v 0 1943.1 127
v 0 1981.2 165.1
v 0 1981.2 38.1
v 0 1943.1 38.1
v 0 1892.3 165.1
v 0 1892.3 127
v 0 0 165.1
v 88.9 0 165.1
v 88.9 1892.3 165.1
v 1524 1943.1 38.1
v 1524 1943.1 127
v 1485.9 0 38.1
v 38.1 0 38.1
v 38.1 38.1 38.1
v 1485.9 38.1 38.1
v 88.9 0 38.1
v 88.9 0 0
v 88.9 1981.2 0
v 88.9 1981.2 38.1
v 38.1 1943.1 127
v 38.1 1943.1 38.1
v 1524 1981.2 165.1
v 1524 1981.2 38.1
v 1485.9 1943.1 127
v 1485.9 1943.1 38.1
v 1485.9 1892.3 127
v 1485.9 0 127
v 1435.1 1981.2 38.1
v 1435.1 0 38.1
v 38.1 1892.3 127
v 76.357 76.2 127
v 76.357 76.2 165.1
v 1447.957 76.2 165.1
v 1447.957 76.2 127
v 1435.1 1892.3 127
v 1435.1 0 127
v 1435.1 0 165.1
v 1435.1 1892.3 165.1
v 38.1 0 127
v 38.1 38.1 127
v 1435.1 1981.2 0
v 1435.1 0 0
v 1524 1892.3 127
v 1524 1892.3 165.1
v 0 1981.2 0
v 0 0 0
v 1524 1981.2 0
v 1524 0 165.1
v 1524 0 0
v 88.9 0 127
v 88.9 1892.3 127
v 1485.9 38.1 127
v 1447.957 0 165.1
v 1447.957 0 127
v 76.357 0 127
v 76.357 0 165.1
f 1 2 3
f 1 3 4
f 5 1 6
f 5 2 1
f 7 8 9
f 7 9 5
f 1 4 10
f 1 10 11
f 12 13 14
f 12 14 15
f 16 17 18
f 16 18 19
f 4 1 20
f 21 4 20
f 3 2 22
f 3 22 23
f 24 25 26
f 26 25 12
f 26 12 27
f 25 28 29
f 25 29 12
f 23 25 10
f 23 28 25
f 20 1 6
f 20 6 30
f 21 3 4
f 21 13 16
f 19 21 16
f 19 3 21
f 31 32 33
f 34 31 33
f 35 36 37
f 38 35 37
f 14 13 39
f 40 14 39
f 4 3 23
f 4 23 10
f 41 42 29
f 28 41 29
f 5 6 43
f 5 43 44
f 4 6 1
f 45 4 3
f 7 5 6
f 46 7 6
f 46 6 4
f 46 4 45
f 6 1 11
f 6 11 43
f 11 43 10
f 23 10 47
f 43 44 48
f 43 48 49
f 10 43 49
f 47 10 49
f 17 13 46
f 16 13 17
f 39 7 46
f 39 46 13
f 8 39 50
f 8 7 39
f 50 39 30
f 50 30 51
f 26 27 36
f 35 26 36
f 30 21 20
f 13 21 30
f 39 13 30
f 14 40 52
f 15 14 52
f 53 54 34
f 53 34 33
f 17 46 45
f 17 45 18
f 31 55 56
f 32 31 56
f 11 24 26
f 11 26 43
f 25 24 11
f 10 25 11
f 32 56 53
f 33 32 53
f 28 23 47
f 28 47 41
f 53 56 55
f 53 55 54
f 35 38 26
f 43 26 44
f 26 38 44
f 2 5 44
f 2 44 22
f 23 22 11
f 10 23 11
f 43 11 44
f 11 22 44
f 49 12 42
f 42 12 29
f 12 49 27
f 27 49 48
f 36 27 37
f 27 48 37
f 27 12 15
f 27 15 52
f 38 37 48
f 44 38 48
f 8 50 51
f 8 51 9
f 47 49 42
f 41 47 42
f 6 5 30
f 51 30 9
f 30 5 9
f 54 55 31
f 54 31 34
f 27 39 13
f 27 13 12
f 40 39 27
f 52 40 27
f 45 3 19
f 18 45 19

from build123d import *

# Parameters (mm, degrees)
F0_W      = 38.1
F0_H      = 88.9
F1_DEPTH  = 1981.2
F4_W      = 1524
F4_H      = 88.9
F5_DEPTH  = 38.1
F6_W      = 1524
F6_H      = 38.1
F7_DEPTH  = 88.9
F9_DEPTH  = 1524
F10_W     = 1447.8
F10_H     = 88.9
F11_DEPTH = 38.1
F12_W     = 1371.6
F12_H     = 38.1
F13_DEPTH = 76.2


with BuildPart() as f1:
    # F0 (on Front) → F1 (new body)
    with BuildSketch(Plane.XZ):
        Polygon((0, 38.1), (0, 0), (88.9, 0), (88.9, 38.1), (38.1, 38.1), align=None)
        with Locations((19.05, 82.55)):
            Rectangle(F0_W, F0_H)
        Polygon((0, 165.1), (0, 127), (38.1, 127), (88.9, 127), (88.9, 165.1), align=None)
    extrude(amount=-F1_DEPTH)


with BuildPart() as f3_1:
    # F3: instance of F1
    add(f1.part.mirror(Plane.YZ.offset(762)))


with BuildPart() as f5_tool:
    # F4 (on face) → F5 (new body)
    with BuildSketch(Plane.XY.offset(165.1)):
        with Locations((762, 1936.75)):
            Rectangle(F4_W, F4_H)
    extrude(amount=-F5_DEPTH)


with BuildPart() as f1_1:
    add(f1.part)

    # F5: cut by f5_tool
    add(f5_tool.part, mode=Mode.SUBTRACT)


with BuildPart() as f3_1_1:
    add(f3_1.part)

    # F5: cut by f5_tool
    add(f5_tool.part, mode=Mode.SUBTRACT)


with BuildPart() as f7_tool:
    # F6 (on face) → F7 (new body)
    with BuildSketch(Plane.XY.offset(127)):
        with Locations((762, 1962.15)):
            Rectangle(F6_W, F6_H)
    extrude(amount=-F7_DEPTH)


with BuildPart() as f1_2:
    add(f1_1.part)

    # F7: cut by f7_tool
    add(f7_tool.part, mode=Mode.SUBTRACT)


with BuildPart() as f3_1_2:
    add(f3_1_1.part)

    # F7: cut by f7_tool
    add(f7_tool.part, mode=Mode.SUBTRACT)


with BuildPart() as f9:
    # F8 (on face) → F9 (new body)
    with BuildSketch(Plane(origin=(0, 0, 0), x_dir=(0, -1, 0), z_dir=(-1, 0, 0))):
        Polygon((-1892.3, 127), (-1892.3, 165.1), (-1981.2, 165.1), (-1981.2, 38.1), (-1943.1, 38.1), (-1943.1, 127), align=None)
    extrude(amount=-F9_DEPTH)


with BuildPart() as f11:
    # F10 (on face) → F11 (new body)
    with BuildSketch(Plane.XZ):
        with Locations((762, 82.55)):
            Rectangle(F10_W, F10_H)
    extrude(amount=-F11_DEPTH)


with BuildPart() as f13:
    # F12 (on face) → F13 (new body)
    with BuildSketch(Plane.XZ):
        with Locations((762.156582, 146.05)):
            Rectangle(F12_W, F12_H)
    extrude(amount=-F13_DEPTH)


solid = Compound([f1_2.part, f3_1_2.part, f9.part, f11.part, f13.part])
